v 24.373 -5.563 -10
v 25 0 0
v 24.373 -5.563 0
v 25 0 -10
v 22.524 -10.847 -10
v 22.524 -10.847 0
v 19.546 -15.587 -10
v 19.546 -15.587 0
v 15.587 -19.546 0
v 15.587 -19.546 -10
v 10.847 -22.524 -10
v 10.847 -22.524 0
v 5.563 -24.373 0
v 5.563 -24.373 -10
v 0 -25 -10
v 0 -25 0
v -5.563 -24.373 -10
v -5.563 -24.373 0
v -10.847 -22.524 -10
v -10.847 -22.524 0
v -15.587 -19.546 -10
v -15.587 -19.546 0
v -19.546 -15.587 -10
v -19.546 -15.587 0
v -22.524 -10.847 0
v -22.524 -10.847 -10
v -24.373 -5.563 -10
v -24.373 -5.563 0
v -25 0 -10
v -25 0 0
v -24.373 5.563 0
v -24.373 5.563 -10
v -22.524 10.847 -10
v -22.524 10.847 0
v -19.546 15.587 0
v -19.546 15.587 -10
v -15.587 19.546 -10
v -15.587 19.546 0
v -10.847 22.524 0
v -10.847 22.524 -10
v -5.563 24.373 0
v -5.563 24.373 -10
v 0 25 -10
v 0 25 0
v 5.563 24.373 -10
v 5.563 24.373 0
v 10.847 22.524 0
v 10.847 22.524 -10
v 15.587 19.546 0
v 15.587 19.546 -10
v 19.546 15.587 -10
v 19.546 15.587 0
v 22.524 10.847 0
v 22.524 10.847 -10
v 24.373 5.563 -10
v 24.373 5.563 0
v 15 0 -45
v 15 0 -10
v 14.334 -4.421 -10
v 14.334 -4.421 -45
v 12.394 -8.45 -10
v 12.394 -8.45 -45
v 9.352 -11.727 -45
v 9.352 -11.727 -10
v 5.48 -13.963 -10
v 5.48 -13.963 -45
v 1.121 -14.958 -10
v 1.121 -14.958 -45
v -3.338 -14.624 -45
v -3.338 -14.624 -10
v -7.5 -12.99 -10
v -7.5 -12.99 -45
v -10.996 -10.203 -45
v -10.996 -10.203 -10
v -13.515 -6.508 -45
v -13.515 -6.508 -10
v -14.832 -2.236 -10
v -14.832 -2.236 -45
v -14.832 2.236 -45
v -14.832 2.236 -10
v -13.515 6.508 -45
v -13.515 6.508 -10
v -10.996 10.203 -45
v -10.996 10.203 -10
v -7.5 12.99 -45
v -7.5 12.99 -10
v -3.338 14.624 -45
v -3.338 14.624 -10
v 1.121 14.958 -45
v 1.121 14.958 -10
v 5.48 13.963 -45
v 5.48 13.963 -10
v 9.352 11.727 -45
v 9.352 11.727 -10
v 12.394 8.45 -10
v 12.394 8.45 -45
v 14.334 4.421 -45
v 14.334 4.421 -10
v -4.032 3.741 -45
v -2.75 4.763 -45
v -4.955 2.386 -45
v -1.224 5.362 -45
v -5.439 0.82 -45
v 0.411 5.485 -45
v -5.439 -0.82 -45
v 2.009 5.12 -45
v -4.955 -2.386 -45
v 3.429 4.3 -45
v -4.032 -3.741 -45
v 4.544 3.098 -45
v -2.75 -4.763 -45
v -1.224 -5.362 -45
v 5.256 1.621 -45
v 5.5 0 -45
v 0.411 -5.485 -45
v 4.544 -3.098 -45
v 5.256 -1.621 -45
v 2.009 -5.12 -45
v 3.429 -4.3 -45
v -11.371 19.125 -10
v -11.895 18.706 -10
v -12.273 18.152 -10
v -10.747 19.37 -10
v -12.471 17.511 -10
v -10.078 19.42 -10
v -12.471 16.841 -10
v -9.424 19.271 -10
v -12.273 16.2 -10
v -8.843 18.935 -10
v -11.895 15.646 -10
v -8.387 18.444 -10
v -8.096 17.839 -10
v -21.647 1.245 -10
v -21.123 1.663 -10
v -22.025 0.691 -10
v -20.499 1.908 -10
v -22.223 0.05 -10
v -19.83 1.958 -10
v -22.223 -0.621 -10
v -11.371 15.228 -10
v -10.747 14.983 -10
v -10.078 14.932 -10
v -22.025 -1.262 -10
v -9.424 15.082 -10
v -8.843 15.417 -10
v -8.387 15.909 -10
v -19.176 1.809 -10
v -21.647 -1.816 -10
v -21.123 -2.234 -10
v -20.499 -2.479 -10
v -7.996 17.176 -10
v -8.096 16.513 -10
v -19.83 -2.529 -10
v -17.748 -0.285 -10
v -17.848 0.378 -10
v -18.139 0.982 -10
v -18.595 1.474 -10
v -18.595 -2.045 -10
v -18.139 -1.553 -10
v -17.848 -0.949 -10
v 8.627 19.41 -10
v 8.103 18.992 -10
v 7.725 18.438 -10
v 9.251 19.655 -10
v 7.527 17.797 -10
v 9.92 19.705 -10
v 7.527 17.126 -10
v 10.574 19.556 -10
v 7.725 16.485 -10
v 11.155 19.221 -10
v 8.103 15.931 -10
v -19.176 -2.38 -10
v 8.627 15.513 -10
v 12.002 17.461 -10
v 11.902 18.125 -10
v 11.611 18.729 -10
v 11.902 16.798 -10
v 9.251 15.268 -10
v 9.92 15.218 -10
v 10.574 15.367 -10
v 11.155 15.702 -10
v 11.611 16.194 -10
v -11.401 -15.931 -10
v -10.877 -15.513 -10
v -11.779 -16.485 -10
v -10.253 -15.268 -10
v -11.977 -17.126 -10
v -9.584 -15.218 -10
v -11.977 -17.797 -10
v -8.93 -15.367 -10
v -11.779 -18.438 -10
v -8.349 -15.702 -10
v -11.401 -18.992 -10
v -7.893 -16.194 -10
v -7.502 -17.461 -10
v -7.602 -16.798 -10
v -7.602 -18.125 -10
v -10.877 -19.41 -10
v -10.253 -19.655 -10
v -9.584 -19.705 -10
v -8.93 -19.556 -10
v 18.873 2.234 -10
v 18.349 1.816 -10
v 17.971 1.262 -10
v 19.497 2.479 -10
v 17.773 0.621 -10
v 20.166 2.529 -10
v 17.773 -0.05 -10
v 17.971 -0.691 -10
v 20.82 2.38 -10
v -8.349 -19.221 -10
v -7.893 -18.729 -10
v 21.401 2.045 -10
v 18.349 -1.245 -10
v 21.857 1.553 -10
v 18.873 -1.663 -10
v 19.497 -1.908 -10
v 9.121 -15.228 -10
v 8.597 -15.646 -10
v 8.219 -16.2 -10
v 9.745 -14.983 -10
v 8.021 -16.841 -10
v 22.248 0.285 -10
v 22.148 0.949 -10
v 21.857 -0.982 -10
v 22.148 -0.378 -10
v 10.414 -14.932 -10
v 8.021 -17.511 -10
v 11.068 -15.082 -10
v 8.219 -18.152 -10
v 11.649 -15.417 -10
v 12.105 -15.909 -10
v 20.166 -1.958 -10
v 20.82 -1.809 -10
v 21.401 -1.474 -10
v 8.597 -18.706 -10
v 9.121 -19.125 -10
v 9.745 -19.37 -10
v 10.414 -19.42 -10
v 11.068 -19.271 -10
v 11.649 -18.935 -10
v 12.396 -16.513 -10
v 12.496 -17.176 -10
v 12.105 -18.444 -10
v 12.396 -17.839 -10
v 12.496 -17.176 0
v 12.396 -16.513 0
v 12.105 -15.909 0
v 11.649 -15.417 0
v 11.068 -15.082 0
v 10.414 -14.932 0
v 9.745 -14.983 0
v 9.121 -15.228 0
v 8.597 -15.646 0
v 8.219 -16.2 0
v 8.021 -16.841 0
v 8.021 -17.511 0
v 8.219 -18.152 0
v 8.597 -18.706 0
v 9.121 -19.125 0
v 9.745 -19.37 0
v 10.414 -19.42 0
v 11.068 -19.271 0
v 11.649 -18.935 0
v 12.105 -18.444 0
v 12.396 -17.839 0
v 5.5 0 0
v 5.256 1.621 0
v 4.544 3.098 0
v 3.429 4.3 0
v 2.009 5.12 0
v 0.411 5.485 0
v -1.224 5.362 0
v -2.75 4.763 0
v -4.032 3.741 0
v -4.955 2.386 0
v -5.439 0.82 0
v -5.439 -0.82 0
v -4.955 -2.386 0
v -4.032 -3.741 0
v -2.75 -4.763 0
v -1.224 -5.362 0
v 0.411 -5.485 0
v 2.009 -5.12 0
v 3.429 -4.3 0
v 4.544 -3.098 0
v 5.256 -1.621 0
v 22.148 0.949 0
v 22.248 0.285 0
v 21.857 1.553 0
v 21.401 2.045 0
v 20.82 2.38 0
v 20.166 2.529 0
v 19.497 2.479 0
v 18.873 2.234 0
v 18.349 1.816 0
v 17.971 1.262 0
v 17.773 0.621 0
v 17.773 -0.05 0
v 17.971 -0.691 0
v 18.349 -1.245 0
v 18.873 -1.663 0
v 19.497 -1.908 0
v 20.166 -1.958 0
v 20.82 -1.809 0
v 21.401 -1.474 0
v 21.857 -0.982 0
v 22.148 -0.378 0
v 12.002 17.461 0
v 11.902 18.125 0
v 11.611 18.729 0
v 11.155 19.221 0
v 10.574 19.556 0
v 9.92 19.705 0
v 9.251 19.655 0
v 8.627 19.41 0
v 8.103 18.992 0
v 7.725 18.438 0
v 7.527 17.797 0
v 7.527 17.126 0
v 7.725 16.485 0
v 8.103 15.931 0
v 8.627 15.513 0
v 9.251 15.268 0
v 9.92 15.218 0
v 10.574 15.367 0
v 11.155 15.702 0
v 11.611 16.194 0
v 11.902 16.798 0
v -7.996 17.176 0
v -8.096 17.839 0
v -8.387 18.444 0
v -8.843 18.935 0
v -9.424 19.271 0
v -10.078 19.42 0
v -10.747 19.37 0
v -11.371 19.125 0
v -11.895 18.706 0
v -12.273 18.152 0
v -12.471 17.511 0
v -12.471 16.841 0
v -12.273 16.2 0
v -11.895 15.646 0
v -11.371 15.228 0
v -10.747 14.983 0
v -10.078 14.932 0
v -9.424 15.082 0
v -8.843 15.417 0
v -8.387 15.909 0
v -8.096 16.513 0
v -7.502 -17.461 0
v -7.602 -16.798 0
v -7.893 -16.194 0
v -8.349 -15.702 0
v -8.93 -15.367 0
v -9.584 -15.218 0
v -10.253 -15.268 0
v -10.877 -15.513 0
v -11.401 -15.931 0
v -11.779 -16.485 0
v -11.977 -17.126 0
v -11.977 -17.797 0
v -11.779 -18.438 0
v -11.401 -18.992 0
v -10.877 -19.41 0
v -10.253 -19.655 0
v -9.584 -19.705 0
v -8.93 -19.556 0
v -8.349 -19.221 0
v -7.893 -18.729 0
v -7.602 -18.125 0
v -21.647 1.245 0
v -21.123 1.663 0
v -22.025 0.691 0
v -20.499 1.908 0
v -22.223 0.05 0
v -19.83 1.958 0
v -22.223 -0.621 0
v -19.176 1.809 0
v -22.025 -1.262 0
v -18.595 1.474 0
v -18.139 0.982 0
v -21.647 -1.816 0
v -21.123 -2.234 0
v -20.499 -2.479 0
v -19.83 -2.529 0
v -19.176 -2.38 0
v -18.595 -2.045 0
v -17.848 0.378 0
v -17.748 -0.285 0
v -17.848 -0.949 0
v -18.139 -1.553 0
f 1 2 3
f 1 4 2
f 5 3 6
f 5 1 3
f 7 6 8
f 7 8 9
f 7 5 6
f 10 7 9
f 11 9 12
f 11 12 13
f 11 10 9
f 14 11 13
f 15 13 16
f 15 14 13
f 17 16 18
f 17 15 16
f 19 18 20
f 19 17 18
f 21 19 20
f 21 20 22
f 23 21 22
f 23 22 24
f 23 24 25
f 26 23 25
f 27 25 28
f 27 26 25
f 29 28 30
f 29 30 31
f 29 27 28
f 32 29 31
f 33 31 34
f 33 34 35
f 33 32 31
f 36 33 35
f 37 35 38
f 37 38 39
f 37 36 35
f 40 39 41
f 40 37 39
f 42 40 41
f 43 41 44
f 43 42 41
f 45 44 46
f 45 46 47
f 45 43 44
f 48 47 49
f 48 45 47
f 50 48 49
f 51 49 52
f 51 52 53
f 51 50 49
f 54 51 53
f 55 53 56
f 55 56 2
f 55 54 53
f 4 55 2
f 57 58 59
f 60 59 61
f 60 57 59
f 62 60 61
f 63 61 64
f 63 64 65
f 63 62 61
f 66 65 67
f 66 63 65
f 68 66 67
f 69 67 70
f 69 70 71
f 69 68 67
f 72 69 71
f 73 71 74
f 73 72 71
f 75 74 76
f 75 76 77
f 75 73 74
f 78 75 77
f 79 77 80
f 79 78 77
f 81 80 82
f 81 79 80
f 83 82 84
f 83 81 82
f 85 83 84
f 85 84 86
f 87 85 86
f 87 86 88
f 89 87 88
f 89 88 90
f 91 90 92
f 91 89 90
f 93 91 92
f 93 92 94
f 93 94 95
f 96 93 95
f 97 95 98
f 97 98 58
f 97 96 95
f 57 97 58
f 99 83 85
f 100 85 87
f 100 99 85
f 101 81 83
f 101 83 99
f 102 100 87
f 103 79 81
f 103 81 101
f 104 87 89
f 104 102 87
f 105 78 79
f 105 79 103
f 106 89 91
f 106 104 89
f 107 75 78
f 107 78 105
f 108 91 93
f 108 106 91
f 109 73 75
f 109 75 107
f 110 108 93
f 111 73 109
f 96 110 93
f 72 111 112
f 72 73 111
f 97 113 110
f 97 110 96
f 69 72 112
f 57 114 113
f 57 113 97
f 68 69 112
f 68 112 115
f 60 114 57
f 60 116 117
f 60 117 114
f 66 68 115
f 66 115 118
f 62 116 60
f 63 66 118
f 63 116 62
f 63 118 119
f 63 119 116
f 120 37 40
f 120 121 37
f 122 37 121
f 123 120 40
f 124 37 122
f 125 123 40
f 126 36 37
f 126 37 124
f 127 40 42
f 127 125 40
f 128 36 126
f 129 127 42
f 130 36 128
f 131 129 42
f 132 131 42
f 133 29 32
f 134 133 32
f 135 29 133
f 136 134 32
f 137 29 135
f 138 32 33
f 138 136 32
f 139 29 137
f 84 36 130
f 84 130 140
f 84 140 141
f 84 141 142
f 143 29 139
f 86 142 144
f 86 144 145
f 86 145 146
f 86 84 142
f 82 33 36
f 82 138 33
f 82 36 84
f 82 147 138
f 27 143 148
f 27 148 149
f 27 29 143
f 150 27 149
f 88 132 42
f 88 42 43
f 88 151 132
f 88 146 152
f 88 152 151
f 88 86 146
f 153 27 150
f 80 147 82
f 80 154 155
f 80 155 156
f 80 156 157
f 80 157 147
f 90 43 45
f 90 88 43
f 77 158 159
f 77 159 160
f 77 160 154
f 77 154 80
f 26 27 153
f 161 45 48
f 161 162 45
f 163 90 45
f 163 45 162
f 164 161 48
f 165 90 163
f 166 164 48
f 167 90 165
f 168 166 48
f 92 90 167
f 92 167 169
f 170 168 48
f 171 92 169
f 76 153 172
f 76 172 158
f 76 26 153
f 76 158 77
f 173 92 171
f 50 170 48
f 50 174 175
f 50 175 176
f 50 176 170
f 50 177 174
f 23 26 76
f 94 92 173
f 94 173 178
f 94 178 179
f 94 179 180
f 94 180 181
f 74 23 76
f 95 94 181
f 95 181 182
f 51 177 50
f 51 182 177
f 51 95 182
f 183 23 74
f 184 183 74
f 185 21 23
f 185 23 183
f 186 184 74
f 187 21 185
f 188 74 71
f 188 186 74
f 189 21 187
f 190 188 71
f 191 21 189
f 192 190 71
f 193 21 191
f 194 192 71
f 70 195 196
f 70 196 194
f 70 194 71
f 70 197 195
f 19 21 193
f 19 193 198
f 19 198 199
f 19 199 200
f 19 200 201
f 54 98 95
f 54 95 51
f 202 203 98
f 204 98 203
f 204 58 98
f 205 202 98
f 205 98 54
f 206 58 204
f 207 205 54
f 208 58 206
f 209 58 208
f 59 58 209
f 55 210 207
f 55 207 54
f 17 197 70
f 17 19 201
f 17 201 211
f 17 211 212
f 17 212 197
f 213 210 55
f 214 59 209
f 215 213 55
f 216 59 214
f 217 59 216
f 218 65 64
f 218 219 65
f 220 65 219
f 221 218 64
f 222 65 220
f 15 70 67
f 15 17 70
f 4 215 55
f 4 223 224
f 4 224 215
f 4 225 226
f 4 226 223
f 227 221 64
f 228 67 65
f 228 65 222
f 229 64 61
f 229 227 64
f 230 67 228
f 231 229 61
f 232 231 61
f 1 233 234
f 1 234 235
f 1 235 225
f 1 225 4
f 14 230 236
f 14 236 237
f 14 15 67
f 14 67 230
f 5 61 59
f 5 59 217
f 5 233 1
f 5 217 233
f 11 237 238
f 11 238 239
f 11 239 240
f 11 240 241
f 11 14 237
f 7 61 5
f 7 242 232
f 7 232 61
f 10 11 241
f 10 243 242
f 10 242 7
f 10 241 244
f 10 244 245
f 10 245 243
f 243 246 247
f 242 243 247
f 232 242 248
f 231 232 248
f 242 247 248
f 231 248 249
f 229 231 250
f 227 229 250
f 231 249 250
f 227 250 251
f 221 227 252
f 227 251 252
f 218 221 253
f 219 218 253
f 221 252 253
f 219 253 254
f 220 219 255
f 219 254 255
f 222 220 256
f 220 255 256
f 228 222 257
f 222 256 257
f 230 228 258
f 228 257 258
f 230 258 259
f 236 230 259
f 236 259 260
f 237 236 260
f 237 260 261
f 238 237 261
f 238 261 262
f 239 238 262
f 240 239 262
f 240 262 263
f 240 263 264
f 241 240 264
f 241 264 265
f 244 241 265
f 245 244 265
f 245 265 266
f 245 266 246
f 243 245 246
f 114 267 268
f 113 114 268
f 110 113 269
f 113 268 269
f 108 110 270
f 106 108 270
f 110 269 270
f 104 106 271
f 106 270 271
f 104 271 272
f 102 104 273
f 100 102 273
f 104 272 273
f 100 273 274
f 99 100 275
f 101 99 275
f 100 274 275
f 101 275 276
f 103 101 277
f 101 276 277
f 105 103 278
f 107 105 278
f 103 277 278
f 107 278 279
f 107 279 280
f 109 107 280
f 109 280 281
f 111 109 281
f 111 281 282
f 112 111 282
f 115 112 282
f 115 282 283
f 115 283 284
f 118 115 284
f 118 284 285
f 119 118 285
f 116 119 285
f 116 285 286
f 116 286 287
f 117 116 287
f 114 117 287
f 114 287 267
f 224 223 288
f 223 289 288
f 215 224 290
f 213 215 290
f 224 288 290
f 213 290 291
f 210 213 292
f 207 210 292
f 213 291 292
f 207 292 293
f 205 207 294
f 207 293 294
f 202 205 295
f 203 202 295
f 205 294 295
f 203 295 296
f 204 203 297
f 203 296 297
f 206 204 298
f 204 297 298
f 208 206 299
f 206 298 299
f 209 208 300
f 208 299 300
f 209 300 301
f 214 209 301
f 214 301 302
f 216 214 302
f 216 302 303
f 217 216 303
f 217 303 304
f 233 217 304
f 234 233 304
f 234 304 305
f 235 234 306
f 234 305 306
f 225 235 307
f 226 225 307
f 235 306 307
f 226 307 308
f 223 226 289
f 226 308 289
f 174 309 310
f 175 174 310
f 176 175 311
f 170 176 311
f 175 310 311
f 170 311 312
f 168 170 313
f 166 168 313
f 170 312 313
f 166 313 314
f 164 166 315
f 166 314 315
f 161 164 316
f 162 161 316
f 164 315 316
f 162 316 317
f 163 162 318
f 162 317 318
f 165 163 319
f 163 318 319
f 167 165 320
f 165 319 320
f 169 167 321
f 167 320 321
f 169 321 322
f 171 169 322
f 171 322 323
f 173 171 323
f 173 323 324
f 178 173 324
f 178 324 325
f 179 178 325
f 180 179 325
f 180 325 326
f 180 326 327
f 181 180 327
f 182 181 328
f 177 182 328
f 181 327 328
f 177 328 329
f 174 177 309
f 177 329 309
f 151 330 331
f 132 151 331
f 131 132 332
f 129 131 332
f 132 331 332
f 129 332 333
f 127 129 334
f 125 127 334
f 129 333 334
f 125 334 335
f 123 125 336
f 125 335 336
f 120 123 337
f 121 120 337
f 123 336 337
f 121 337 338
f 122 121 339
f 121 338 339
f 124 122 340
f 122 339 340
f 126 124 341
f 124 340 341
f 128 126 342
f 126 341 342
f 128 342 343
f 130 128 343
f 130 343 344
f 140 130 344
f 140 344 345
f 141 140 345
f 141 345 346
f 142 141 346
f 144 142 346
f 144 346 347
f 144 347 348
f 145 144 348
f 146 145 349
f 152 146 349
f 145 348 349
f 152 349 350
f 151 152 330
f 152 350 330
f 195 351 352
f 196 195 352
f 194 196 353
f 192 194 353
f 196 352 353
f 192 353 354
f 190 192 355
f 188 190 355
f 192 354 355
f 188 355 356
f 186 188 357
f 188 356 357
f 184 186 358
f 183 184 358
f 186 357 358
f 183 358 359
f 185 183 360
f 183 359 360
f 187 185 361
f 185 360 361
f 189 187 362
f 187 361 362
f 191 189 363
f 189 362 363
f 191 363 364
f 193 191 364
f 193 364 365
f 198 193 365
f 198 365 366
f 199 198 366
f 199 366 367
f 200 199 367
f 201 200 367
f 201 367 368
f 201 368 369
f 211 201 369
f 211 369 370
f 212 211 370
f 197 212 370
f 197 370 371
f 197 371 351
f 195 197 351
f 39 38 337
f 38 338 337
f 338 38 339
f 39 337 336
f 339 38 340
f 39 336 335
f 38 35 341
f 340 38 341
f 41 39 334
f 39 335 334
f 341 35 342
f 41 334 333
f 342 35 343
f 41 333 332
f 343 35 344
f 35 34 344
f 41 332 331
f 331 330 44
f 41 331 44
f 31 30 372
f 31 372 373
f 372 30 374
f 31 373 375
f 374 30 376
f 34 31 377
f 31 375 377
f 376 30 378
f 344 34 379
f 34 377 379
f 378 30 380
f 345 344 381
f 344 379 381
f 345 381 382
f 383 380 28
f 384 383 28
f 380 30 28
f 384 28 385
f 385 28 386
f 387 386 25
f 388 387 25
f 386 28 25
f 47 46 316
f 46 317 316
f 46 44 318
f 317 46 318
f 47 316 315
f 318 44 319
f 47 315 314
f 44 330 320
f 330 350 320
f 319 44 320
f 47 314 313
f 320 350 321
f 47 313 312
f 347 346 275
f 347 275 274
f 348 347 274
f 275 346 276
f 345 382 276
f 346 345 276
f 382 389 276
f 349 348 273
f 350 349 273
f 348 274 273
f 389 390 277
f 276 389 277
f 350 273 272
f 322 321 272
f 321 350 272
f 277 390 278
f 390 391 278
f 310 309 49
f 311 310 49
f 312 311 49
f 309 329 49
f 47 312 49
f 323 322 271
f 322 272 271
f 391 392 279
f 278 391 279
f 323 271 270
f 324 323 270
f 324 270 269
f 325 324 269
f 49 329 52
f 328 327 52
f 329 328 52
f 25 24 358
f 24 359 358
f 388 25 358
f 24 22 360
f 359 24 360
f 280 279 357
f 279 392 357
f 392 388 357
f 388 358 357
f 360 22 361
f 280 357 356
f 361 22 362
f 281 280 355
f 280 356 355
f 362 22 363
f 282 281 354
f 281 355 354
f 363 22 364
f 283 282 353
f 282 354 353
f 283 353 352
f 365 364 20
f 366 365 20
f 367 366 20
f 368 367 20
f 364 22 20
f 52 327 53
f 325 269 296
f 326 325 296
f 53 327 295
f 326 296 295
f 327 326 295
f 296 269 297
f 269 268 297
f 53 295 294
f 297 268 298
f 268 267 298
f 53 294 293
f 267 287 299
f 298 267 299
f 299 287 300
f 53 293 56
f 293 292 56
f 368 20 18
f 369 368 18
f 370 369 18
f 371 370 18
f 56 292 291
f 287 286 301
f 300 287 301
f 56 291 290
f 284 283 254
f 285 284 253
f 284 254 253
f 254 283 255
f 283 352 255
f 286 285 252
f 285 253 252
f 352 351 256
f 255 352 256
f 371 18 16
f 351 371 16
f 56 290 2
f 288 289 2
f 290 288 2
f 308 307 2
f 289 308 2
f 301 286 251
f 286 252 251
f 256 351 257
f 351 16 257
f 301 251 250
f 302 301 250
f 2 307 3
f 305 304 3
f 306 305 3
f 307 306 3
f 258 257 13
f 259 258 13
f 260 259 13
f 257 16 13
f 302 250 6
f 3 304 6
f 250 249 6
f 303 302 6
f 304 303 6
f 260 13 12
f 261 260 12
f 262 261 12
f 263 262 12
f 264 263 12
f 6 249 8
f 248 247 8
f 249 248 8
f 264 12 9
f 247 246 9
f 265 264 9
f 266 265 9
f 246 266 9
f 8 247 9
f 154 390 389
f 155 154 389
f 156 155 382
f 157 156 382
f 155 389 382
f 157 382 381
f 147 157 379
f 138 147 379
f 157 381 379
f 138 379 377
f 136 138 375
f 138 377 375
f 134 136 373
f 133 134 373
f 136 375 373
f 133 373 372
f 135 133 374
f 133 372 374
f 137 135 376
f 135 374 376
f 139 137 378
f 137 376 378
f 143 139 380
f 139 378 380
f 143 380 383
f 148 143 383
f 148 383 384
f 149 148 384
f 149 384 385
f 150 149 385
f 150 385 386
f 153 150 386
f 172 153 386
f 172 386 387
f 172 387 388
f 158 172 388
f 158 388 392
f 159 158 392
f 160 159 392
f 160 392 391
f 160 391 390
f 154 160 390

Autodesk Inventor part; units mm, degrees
ref_plane "YZ Plane" through (0, 0, 0) normal (1, 0, 0) x (0, 1, 0)
ref_plane "XZ Plane" through (0, 0, 0) normal (0, 1, 0) x (-1, 0, 0)
ref_plane "XY Plane" through (0, 0, 0) normal (0, 0, 1) x (1, 0, 0)
sketch "Sketch1" plane through (0, 0, 0) normal (0, 1, 0) x (-1, 0, 0)
  line L0 (0, 0) -> (-25, 0)
  line L1 (-25, 0) -> (-25, -10)
  line L2 (-25, -10) -> (-15, -10)
  line L3 (-15, -10) -> (-15, -45)
  line L4 (-15, -45) -> (0, -45)
  line L5 (0, 0) -> (0, -45)
  dimension "d3" = 25
  dimension "d4" = 10
  dimension "d5" = 10
  dimension "d6" = 35
  dimension "d7" = 15
revolve "Revolution1" add sketch "Sketch1" angle 360 about axis through (0, 0, 0) along (0, 0, -1)
sketch "Sketch2" plane through (0, 0, 0) normal (0, 0, 1) x (1, 0, 0)
  line L0 (0, 0) -> (30.242, 0) construction
  line L1 (0, 0.5707) -> (22.435, 0.5707) construction
  circle A0 centre (9.7519, 17.4614) radius 2.25
  circle A1 centre (19.998, 0.2854) radius 2.25
  circle A2 centre (10.2461, -17.1761) radius 2.25
  circle A3 centre (-9.7519, -17.4614) radius 2.25
  circle A4 centre (-19.998, -0.2854) radius 2.25
  circle A5 centre (-10.2461, 17.1761) radius 2.25
  dimension "d12" = 4.5
  dimension "d15" = 360
extrude "Extrusion1" cut sketch "Sketch2" against normal through all
sketch "Sketch3" plane through (0, 0, 0) normal (0, 0, 1) x (1, 0, 0)
  circle A0 centre (0, 0) radius 5.5
  dimension "d19" = 11
extrude "Extrusion2" cut sketch "Sketch3" against normal through all
thread "Thread1" size "1/2-13 UNC" class "2B" standard "ANSI Unified Screw Threads" full length
properties part number "nut"
